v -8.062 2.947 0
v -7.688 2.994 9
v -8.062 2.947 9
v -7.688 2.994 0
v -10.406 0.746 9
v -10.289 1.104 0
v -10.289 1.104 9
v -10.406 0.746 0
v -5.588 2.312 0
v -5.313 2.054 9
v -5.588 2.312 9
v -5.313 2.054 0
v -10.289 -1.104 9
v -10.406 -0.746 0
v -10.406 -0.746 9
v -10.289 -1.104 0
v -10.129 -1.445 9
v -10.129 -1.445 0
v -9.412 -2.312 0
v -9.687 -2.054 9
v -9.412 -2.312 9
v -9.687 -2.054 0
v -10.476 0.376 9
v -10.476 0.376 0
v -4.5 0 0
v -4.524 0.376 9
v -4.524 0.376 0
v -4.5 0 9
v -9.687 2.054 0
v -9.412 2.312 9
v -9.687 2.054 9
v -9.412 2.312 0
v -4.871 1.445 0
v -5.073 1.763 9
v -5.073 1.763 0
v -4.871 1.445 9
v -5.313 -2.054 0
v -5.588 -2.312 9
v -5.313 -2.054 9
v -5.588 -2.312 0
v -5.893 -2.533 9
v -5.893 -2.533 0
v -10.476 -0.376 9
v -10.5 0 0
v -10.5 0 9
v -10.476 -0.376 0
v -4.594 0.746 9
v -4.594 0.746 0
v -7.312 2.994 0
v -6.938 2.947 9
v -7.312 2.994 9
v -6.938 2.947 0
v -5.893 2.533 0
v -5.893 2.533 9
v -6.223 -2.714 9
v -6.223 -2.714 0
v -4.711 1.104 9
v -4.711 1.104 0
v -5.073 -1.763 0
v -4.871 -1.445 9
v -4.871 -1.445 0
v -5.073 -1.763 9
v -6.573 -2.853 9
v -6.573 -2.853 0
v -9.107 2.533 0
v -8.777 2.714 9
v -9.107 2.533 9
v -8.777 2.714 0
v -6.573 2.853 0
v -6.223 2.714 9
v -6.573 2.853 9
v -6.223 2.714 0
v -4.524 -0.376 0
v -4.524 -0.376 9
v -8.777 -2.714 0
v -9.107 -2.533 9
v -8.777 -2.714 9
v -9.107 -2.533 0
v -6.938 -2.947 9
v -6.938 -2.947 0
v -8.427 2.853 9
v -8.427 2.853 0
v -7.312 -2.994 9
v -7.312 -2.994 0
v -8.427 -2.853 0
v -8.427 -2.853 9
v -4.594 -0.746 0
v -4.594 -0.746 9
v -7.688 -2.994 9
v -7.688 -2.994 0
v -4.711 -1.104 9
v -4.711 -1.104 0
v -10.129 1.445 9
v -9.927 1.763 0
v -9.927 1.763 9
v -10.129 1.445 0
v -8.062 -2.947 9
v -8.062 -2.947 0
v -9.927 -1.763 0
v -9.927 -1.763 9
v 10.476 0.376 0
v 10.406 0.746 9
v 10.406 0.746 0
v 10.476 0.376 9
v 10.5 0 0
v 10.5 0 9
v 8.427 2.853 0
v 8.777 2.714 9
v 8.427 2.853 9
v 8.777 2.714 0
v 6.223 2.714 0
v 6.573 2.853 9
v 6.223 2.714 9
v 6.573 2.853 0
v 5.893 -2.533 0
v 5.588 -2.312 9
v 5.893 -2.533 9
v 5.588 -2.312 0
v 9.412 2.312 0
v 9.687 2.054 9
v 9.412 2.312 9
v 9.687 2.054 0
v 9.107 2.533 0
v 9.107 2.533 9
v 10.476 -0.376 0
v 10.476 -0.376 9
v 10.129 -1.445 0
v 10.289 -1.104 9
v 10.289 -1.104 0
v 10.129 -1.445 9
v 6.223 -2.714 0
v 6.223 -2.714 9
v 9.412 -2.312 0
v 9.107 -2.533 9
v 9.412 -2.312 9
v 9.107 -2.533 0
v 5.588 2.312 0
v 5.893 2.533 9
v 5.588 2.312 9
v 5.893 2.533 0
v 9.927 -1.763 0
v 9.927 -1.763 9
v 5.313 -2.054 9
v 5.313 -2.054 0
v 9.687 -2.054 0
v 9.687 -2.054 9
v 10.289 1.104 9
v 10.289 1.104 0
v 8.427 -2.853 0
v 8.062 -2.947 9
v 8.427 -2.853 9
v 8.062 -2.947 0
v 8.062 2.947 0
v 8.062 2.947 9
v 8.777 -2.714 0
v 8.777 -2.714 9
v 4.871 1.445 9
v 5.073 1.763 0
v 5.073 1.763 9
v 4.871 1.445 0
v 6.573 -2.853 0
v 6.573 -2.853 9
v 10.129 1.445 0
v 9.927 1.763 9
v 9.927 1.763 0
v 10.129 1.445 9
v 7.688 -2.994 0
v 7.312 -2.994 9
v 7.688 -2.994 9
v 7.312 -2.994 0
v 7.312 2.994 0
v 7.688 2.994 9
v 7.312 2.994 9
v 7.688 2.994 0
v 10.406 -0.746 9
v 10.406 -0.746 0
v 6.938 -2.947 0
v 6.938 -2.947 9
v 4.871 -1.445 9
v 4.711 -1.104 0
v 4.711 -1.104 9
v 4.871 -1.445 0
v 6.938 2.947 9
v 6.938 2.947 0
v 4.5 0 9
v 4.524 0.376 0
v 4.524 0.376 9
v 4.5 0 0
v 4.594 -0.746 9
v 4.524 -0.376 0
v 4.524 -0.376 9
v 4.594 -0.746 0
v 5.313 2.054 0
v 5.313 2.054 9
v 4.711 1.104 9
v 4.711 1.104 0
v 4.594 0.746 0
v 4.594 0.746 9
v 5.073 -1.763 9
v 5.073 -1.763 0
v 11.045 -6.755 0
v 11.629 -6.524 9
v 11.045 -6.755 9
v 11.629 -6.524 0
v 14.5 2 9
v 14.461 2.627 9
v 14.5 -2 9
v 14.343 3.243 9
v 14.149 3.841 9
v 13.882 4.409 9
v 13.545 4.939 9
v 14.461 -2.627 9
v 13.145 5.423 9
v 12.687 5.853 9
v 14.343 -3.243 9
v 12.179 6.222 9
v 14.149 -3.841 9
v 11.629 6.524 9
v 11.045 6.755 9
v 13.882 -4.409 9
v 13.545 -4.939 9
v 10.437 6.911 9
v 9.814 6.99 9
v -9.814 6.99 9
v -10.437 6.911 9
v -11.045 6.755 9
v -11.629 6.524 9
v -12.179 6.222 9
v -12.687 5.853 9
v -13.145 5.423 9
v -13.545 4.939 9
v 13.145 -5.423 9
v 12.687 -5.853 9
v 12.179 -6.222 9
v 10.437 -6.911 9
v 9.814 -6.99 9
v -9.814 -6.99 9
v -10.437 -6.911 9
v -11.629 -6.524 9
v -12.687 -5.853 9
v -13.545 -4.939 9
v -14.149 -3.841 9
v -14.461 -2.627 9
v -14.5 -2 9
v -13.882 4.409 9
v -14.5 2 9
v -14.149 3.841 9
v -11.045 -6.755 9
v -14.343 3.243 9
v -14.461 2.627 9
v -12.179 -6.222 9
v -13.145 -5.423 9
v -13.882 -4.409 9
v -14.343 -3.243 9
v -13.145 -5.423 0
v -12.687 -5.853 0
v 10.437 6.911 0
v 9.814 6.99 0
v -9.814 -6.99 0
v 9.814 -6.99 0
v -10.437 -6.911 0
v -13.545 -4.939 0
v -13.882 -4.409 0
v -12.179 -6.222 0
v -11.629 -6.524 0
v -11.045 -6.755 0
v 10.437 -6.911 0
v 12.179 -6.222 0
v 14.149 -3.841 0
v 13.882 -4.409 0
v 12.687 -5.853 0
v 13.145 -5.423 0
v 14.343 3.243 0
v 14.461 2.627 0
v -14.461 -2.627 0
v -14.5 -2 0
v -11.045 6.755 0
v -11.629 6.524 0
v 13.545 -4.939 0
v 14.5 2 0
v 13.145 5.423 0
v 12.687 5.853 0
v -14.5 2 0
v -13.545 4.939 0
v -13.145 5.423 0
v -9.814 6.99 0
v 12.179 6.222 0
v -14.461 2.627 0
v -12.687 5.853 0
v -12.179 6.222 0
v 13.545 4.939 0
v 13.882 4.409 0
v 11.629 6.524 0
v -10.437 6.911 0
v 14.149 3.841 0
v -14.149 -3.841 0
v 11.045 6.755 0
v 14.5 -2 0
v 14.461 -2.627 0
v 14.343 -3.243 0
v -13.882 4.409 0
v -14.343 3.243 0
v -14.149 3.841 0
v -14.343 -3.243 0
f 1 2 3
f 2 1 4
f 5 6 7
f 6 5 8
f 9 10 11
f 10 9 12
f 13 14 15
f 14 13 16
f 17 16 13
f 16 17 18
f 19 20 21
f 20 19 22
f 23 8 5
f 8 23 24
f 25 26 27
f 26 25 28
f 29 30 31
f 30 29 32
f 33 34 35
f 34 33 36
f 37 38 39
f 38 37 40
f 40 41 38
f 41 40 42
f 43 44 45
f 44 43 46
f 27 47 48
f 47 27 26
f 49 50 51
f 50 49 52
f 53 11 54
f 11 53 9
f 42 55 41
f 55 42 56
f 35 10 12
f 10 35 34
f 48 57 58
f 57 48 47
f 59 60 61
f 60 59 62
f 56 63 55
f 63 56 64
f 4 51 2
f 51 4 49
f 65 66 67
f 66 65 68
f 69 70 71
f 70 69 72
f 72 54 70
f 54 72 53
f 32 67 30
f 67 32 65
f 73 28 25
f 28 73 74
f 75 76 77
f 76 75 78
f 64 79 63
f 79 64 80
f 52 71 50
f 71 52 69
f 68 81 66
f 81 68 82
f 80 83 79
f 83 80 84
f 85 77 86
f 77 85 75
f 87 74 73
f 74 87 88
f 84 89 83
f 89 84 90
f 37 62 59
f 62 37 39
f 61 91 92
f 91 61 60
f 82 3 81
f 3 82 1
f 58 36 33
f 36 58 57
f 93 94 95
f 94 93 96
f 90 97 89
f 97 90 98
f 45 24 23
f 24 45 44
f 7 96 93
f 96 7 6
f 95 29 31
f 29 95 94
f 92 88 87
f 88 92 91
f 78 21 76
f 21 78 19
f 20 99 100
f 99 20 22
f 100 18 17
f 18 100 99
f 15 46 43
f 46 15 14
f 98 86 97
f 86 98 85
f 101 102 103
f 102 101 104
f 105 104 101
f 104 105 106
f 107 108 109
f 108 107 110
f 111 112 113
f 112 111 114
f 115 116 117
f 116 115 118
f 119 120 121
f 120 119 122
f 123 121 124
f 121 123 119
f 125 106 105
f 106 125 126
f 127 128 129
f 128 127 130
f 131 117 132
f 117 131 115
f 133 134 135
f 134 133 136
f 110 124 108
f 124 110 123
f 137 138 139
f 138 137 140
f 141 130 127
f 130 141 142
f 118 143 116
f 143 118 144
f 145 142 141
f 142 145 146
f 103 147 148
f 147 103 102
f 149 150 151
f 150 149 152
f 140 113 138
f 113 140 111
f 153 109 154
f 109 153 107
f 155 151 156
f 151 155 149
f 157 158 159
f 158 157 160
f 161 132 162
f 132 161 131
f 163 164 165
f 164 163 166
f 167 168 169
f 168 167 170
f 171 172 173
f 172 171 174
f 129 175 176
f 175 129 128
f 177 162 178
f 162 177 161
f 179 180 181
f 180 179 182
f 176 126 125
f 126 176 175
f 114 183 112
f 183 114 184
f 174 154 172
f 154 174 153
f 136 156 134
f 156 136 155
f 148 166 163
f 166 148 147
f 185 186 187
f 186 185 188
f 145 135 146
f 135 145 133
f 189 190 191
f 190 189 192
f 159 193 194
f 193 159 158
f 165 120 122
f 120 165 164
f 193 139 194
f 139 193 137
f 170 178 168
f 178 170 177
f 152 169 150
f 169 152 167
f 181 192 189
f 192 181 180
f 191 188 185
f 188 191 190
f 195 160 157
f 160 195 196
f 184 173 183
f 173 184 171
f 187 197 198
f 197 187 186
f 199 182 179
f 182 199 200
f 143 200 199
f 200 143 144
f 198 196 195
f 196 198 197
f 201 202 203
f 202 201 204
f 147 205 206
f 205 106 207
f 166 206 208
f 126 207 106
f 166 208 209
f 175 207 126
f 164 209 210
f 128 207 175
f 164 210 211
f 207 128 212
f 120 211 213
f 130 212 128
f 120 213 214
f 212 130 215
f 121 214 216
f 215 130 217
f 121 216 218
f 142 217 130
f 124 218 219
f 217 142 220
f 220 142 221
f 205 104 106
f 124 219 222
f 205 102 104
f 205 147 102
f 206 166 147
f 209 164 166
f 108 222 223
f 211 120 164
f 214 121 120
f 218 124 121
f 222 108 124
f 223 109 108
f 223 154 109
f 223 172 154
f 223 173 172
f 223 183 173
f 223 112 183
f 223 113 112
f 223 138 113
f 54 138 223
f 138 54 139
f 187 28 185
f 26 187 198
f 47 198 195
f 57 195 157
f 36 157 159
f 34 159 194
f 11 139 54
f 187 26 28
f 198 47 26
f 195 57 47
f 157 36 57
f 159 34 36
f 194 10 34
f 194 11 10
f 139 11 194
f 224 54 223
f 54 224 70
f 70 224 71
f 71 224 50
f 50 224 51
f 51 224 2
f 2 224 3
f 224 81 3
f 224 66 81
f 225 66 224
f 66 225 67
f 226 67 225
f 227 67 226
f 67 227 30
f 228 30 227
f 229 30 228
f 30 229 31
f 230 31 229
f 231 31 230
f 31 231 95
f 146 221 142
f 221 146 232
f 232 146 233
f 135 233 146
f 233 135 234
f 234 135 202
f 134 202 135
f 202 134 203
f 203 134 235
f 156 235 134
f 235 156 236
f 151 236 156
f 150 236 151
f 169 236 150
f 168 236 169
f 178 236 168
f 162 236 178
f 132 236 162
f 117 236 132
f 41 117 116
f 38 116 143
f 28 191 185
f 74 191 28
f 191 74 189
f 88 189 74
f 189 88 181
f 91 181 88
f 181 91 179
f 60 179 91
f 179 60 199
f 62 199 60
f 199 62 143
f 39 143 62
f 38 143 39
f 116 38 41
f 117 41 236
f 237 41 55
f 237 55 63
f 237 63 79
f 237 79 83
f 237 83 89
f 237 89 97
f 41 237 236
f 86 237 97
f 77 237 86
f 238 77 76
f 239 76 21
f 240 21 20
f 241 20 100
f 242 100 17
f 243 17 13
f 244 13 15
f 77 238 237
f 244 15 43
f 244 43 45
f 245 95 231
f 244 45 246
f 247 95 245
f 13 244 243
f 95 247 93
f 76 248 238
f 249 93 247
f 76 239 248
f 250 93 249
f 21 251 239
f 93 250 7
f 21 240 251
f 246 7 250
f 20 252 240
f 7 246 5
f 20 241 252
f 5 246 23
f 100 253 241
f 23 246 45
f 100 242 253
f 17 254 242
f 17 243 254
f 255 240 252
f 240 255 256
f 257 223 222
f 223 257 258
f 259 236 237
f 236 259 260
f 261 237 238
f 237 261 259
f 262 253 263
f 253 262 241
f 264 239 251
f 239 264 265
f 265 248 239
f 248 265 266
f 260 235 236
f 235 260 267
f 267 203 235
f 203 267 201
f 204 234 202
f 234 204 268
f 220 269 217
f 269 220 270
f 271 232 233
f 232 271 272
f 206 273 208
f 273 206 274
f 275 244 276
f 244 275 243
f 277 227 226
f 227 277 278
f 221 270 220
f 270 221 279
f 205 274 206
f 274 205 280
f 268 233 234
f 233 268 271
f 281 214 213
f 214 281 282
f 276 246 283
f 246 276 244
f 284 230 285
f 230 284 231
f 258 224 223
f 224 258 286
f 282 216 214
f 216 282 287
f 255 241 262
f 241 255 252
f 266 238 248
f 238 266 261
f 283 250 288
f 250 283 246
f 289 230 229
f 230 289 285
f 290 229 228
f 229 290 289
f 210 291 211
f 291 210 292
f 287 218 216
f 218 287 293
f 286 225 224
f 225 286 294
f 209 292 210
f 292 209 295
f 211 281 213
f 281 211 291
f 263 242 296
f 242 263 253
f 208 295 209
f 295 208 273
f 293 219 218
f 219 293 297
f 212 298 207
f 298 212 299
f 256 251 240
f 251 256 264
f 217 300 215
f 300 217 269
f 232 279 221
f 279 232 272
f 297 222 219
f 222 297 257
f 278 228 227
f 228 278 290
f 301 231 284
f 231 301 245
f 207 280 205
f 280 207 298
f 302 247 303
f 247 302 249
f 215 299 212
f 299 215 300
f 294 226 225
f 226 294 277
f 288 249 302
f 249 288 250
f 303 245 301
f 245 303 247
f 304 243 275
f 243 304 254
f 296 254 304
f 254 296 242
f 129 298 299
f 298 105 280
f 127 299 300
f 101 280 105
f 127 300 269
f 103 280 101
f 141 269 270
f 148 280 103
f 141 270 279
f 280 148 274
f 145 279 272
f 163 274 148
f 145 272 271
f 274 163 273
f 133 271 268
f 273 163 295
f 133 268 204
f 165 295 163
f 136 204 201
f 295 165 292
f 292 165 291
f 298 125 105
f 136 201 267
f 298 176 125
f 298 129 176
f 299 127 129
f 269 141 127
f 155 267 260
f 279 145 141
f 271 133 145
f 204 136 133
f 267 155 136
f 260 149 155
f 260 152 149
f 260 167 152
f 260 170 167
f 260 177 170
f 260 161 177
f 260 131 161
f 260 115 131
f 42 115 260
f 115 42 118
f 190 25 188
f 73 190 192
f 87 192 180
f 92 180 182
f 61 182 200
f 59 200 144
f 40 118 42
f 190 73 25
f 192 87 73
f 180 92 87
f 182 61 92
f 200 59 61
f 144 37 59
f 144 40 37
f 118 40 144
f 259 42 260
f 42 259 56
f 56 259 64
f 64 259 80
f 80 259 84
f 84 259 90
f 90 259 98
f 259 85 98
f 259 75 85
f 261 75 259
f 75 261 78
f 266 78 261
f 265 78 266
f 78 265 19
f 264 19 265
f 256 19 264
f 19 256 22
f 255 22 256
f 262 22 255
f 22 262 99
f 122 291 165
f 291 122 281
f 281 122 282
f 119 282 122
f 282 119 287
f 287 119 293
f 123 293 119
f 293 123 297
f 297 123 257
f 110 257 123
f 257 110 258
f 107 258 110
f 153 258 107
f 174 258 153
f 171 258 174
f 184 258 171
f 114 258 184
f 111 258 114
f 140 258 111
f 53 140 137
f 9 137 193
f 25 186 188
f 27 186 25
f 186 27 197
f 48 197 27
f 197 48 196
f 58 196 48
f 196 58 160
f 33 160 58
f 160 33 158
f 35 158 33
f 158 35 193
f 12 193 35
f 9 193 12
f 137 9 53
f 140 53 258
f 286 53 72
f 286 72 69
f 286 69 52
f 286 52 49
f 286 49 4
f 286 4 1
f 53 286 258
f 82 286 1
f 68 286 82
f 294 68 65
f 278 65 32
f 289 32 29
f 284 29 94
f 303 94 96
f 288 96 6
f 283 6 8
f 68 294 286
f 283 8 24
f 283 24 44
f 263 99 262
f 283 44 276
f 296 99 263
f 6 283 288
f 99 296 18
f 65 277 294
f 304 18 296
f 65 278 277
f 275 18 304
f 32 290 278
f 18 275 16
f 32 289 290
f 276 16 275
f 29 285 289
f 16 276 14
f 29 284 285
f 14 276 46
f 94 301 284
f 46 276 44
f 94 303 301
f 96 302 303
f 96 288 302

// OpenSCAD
$fn = 50;


difference() {
	union() {
		hull() {
			translate(v = [-9.5000000000, 2.0000000000, 0]) {
				cylinder(h = 9, r = 5);
			}
			translate(v = [9.5000000000, 2.0000000000, 0]) {
				cylinder(h = 9, r = 5);
			}
			translate(v = [-9.5000000000, -2.0000000000, 0]) {
				cylinder(h = 9, r = 5);
			}
			translate(v = [9.5000000000, -2.0000000000, 0]) {
				cylinder(h = 9, r = 5);
			}
		}
	}
	union() {
		translate(v = [-7.5000000000, 0.0000000000, -100.0000000000]) {
			cylinder(h = 200, r = 3.0000000000);
		}
		translate(v = [-7.5000000000, 0.0000000000, -100.0000000000]) {
			cylinder(h = 200, r = 3.0000000000);
		}
		translate(v = [7.5000000000, 0.0000000000, -100.0000000000]) {
			cylinder(h = 200, r = 3.0000000000);
		}
		translate(v = [7.5000000000, 0.0000000000, -100.0000000000]) {
			cylinder(h = 200, r = 3.0000000000);
		}
	}
}
